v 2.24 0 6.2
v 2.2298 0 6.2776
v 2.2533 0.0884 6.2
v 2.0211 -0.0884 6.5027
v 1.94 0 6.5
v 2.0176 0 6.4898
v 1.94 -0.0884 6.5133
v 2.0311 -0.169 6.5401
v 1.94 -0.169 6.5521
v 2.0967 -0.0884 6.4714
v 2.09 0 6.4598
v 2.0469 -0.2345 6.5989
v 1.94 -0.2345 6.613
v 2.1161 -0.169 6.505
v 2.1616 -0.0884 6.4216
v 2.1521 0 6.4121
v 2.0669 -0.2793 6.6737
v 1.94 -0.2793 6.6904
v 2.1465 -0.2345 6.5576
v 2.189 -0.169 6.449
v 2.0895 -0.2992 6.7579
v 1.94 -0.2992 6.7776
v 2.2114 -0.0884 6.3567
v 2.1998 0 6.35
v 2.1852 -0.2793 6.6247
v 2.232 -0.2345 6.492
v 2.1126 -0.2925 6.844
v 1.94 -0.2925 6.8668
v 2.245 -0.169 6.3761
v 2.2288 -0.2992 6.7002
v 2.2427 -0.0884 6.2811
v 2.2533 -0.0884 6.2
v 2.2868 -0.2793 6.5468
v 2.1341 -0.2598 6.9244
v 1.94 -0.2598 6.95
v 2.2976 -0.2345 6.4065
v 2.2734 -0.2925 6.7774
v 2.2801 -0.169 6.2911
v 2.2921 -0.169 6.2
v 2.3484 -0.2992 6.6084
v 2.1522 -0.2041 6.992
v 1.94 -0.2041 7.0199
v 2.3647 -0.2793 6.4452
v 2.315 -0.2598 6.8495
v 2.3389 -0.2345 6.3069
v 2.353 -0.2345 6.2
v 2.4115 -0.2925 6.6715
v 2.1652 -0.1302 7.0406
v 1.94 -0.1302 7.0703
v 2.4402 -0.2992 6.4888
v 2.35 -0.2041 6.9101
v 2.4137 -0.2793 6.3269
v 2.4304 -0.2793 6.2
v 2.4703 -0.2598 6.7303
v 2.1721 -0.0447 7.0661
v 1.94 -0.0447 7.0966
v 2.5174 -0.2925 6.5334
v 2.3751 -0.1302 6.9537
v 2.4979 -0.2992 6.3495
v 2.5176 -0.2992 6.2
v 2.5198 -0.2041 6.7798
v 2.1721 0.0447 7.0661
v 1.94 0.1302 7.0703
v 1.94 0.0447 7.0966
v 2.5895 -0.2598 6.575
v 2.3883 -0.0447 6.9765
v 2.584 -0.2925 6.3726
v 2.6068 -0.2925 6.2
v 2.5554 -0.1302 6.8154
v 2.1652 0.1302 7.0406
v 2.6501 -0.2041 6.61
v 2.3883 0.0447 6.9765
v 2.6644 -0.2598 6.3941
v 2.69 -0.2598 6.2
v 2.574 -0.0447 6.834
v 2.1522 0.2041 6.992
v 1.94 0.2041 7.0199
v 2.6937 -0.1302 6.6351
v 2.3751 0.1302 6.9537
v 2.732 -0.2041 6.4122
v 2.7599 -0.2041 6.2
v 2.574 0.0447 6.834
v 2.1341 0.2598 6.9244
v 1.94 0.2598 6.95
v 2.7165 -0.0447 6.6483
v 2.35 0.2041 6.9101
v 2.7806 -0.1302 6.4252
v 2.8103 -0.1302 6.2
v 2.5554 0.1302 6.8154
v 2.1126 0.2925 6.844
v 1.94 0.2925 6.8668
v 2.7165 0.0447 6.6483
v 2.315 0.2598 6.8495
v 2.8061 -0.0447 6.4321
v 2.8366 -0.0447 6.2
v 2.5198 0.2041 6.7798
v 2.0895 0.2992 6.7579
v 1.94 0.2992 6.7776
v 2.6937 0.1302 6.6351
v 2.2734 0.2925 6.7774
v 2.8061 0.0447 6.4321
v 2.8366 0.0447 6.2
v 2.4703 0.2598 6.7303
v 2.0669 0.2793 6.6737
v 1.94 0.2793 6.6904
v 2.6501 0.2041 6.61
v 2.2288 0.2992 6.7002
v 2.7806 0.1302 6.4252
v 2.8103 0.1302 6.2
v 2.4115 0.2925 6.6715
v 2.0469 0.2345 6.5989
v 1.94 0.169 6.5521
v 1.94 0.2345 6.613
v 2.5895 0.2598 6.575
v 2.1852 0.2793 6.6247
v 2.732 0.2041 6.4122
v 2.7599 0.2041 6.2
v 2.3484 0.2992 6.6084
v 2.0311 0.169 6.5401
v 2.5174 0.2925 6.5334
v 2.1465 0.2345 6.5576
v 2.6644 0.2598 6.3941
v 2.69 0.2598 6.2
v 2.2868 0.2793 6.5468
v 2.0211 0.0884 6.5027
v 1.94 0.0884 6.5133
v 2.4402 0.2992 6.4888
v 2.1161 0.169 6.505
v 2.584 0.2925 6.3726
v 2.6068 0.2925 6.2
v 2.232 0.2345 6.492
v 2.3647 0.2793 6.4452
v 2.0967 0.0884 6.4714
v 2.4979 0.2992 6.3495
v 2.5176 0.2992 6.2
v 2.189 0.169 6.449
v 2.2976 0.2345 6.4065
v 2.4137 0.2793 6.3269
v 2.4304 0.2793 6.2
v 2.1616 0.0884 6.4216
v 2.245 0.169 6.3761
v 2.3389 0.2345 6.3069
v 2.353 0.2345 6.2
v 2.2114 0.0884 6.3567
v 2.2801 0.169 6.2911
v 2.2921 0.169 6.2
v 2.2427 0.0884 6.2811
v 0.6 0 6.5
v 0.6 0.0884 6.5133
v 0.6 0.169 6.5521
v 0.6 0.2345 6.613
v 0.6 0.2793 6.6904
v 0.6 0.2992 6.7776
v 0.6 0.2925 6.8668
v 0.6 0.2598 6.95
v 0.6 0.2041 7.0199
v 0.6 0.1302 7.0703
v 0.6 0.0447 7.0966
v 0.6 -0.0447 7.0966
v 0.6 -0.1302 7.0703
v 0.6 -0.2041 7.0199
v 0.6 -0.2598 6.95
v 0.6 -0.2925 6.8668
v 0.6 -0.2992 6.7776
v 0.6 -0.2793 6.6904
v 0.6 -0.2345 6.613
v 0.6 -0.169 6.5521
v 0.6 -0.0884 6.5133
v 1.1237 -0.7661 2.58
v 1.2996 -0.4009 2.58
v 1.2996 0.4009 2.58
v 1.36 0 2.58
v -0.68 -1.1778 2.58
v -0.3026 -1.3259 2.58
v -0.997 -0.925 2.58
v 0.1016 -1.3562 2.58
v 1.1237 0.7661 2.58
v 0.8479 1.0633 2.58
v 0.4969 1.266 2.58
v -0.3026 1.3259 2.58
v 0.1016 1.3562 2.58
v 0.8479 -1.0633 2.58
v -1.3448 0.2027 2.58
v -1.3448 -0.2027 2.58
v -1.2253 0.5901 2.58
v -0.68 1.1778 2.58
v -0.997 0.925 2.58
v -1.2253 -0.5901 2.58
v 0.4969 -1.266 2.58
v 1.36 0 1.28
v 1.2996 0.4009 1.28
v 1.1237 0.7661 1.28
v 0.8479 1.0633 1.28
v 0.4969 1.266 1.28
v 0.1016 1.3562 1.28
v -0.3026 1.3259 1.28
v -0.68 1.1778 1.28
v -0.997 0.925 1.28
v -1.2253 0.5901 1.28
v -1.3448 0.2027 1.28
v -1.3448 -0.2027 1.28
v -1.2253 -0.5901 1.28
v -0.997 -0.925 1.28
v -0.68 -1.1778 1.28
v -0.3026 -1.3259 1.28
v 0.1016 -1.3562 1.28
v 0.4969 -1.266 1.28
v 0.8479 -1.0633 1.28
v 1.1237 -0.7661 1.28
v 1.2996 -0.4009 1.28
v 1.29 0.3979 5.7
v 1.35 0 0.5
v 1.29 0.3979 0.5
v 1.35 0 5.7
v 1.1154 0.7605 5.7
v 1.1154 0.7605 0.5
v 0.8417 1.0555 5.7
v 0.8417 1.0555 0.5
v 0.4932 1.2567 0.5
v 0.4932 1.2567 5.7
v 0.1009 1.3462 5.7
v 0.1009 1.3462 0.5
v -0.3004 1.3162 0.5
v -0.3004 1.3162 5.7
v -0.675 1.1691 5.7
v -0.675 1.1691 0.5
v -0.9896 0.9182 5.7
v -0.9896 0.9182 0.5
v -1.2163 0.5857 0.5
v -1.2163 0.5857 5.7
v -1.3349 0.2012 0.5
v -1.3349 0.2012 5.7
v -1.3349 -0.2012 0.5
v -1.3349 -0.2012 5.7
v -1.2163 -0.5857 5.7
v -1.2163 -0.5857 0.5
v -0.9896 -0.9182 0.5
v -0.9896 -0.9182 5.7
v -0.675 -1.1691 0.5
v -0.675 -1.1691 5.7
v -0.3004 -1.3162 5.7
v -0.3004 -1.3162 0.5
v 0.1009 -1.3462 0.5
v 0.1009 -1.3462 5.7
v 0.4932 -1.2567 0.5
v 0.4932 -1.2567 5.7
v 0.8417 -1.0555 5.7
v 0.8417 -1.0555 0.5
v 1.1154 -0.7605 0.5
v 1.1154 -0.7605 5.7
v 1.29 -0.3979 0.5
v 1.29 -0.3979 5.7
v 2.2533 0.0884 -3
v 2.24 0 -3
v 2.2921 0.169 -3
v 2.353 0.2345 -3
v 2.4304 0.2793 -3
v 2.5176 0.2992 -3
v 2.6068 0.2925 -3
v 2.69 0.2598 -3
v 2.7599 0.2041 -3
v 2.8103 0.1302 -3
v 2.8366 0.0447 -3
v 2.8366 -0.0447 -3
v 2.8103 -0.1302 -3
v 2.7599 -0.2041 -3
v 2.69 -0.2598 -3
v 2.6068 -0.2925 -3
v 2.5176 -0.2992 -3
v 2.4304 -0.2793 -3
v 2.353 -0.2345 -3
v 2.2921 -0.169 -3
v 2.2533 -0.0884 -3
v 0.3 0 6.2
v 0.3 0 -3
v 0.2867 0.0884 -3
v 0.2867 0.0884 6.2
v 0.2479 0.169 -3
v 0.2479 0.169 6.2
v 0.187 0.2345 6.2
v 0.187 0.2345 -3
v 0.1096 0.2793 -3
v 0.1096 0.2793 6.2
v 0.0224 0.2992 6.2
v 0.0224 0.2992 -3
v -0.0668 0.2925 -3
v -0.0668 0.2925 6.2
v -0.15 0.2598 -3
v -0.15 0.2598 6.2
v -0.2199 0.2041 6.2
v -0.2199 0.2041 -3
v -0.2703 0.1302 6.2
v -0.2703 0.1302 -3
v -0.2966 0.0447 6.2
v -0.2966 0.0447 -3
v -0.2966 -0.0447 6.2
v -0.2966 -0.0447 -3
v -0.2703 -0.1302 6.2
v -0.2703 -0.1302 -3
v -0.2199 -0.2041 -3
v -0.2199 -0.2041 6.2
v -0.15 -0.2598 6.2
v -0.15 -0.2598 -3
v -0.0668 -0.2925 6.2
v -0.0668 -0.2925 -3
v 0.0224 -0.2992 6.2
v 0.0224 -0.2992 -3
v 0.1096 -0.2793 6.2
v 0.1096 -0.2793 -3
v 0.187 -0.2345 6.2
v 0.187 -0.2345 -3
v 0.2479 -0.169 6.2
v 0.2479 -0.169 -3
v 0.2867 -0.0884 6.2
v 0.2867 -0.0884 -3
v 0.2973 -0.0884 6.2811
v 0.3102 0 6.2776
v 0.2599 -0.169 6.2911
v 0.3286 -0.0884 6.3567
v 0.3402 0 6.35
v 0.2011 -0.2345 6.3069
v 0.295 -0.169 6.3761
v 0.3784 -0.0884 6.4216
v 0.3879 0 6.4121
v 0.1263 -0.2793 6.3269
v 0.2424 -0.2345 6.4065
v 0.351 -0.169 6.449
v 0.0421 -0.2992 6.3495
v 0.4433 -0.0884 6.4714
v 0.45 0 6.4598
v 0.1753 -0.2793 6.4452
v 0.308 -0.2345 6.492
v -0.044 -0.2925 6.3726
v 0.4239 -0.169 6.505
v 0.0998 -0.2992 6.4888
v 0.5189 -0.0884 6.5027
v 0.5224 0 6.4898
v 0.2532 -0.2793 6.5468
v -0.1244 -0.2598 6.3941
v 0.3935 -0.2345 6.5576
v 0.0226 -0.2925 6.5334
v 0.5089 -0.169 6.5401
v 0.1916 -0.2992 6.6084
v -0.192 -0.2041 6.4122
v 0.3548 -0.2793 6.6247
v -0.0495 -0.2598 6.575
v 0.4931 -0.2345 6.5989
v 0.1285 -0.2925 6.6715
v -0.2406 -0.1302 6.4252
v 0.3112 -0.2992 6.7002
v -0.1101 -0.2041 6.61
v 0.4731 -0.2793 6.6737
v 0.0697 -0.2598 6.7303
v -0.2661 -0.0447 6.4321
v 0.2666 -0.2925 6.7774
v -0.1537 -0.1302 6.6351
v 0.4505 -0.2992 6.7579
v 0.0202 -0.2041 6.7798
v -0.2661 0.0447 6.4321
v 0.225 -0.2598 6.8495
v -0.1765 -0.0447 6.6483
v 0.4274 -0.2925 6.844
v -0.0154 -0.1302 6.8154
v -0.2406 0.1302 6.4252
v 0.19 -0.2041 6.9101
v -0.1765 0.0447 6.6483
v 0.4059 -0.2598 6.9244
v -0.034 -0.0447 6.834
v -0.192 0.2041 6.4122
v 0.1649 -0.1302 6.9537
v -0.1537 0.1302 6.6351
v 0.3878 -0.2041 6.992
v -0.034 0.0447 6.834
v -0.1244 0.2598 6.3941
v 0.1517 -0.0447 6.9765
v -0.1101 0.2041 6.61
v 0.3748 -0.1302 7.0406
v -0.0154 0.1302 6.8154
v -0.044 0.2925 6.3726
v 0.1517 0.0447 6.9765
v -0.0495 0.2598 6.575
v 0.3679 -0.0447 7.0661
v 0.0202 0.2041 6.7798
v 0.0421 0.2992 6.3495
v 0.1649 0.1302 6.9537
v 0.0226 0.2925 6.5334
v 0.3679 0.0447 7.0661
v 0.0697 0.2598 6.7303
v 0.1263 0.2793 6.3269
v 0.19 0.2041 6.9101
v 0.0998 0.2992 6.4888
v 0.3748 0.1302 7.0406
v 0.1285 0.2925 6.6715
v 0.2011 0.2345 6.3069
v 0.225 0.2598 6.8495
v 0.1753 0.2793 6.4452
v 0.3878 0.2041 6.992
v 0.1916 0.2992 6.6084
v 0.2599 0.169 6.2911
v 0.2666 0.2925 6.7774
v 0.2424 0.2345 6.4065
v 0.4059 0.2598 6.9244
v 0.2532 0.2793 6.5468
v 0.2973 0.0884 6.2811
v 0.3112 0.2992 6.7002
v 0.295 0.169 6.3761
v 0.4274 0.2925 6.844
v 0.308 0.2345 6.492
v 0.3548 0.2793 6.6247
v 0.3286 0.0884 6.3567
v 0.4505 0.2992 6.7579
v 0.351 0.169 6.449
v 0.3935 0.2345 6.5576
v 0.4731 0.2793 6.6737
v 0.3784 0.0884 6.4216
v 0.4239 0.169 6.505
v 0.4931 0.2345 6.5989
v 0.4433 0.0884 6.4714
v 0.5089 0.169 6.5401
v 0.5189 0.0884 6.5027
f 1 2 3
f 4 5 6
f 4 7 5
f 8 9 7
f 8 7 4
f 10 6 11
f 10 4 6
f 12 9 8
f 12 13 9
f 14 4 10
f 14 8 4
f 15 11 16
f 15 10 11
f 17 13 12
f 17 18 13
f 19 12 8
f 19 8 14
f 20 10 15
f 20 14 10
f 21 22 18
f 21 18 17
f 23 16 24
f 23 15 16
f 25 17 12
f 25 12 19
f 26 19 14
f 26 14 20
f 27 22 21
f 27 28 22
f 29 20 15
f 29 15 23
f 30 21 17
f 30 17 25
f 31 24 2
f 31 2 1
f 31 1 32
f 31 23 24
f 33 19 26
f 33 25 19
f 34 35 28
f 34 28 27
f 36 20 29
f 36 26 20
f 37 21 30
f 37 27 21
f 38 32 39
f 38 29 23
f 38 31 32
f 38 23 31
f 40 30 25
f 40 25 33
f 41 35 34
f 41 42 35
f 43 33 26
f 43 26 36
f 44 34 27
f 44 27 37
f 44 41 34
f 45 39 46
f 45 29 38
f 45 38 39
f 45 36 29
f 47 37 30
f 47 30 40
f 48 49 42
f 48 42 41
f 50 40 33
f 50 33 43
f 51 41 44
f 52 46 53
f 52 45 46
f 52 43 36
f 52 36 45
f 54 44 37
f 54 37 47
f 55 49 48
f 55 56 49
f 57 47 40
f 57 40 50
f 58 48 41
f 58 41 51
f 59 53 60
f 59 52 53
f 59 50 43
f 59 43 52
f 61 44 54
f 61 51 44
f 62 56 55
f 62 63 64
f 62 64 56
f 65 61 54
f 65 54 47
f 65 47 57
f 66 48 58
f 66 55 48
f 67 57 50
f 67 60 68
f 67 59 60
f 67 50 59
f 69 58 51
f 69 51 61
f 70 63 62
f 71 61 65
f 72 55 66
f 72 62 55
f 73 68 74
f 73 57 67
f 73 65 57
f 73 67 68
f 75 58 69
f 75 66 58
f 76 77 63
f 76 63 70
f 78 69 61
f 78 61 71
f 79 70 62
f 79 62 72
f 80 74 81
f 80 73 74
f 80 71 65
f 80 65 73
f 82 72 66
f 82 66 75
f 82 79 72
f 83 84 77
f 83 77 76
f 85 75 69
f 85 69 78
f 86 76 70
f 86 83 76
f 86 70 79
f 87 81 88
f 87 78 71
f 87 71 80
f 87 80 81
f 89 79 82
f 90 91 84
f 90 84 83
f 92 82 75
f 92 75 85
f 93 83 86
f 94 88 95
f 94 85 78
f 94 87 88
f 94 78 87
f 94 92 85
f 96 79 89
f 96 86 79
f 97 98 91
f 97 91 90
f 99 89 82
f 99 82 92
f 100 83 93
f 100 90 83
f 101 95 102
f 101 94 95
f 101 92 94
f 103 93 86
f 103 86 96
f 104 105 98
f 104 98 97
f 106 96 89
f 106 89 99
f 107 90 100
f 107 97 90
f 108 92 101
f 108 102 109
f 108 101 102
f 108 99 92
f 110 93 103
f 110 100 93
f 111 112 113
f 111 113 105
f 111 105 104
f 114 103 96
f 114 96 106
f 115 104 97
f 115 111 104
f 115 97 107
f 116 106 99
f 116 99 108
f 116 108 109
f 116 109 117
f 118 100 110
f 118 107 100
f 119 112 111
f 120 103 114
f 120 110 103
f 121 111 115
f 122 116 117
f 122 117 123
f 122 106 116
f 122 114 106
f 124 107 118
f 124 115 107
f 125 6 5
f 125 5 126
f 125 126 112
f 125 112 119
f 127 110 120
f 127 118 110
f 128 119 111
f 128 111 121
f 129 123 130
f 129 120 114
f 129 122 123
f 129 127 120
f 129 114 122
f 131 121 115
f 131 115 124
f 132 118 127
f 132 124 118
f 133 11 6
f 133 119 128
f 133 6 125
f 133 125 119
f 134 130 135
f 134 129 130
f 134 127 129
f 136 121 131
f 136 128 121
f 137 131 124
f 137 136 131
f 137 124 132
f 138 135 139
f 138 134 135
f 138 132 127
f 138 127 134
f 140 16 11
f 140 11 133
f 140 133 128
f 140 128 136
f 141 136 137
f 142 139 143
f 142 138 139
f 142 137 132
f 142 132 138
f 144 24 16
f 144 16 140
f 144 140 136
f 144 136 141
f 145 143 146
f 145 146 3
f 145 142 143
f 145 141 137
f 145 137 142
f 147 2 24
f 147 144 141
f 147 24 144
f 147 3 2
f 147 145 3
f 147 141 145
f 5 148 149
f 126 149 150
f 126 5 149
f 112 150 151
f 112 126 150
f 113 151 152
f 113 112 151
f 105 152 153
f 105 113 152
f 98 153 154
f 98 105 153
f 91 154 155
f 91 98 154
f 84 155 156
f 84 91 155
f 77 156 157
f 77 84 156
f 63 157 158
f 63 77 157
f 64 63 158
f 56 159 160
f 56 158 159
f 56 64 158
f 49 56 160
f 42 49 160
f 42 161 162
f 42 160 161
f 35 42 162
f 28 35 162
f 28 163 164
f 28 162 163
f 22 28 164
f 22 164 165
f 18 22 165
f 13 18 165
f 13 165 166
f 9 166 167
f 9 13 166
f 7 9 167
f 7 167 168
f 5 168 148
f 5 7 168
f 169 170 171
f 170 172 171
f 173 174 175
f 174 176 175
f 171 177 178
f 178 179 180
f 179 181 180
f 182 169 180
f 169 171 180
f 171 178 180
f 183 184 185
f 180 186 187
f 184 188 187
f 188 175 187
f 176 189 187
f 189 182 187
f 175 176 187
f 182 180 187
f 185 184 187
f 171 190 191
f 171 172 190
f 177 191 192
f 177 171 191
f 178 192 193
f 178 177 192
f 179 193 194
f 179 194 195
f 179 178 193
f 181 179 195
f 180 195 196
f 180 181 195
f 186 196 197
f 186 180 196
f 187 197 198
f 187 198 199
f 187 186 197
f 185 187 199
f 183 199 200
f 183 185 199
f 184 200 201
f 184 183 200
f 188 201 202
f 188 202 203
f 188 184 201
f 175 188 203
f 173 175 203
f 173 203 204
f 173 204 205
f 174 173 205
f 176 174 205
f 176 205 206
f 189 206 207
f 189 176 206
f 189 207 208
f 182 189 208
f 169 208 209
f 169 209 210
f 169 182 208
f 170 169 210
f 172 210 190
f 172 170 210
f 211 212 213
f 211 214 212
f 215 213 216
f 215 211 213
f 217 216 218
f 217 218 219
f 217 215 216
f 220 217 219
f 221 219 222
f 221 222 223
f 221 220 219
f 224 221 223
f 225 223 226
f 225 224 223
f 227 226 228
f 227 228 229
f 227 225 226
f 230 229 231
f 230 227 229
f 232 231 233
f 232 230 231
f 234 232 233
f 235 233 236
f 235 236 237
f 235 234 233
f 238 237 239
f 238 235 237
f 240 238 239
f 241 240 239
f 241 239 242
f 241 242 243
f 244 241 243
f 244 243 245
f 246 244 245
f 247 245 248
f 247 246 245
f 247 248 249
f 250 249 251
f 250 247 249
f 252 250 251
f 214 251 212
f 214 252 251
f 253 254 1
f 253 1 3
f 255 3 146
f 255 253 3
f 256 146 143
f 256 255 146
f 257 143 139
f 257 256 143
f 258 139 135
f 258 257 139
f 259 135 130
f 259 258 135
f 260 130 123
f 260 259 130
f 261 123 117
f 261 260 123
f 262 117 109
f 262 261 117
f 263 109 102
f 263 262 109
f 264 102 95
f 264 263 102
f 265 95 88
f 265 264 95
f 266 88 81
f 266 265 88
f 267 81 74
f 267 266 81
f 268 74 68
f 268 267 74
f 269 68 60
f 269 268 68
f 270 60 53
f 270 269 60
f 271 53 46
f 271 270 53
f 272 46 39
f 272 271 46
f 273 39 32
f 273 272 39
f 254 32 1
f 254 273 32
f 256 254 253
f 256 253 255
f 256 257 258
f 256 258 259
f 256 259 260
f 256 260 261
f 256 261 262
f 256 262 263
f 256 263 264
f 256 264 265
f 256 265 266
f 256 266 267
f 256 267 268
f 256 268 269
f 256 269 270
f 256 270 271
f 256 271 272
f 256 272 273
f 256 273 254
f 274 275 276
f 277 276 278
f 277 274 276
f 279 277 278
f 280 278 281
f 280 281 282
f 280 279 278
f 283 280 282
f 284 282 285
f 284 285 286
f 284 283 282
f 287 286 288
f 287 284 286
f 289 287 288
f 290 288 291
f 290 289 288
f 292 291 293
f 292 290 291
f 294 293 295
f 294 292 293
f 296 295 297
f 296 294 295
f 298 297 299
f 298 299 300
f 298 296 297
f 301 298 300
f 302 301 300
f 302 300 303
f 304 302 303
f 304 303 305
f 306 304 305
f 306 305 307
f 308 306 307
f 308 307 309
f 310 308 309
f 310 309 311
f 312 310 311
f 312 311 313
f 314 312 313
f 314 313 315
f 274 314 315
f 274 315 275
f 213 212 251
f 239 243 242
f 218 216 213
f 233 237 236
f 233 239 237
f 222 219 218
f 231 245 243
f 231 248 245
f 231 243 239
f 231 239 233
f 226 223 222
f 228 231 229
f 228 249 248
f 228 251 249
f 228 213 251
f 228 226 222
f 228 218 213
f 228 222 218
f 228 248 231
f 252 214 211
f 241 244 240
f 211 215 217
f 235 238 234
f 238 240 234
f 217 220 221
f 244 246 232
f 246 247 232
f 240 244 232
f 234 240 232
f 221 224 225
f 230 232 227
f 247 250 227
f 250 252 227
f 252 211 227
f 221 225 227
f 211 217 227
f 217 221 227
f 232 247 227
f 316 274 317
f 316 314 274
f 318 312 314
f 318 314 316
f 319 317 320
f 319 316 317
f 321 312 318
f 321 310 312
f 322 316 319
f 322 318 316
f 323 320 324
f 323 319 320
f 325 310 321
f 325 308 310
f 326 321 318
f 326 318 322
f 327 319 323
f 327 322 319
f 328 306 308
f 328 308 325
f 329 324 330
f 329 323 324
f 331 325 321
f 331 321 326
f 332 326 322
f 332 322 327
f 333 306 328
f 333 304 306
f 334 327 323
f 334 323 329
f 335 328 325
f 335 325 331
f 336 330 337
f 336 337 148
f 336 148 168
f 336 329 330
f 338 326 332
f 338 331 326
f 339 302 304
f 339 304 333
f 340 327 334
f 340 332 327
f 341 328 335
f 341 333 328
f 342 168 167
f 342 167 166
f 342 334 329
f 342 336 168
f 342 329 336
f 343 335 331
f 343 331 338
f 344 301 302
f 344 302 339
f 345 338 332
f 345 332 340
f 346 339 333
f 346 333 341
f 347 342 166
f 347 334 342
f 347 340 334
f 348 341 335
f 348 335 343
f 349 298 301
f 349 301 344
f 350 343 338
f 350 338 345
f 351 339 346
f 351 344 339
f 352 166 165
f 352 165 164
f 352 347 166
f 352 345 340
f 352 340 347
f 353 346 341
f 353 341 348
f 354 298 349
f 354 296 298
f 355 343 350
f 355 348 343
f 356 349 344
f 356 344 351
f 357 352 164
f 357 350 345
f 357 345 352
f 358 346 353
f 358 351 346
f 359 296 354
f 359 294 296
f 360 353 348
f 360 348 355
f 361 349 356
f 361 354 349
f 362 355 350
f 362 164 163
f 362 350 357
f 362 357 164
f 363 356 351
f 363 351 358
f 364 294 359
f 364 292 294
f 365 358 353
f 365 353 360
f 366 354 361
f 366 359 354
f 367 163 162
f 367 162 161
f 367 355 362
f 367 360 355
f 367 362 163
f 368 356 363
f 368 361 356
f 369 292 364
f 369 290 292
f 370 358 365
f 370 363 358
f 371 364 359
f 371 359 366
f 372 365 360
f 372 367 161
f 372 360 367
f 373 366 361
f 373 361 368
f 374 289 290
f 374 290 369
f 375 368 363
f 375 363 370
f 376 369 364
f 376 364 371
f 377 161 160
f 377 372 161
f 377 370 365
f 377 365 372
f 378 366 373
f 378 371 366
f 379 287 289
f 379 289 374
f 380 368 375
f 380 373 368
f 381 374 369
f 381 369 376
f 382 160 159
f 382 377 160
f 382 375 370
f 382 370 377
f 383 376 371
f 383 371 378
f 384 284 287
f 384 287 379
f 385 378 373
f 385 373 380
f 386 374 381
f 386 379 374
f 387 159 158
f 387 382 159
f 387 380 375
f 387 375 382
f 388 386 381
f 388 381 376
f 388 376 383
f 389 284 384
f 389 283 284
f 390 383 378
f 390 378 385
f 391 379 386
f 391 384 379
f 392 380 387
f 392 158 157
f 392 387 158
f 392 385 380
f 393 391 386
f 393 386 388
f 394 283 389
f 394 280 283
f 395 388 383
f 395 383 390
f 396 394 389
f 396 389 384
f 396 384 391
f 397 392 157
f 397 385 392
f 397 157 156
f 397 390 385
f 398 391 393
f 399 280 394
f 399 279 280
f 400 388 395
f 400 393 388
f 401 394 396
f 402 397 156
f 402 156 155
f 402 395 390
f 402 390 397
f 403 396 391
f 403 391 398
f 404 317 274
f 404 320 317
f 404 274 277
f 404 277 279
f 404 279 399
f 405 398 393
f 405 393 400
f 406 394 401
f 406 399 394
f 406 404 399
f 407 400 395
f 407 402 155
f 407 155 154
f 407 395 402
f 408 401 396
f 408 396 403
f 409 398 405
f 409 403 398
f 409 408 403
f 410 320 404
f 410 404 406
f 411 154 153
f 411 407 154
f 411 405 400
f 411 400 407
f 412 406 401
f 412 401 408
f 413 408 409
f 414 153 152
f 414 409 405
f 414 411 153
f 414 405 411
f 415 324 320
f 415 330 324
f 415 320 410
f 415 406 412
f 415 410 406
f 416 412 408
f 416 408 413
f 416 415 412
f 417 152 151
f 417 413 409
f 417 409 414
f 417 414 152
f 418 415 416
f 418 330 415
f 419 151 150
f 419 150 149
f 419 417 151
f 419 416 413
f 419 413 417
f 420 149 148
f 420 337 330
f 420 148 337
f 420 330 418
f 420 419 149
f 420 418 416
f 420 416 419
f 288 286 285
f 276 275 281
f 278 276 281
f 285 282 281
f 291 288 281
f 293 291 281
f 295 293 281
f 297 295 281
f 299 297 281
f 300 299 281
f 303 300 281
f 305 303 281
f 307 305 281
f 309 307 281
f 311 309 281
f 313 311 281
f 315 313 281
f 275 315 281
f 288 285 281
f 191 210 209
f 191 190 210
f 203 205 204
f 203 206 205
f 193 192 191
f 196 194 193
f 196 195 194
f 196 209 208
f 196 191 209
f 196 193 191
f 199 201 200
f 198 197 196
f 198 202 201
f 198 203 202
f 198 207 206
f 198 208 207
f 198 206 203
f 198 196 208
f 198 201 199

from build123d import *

# Parameters (mm, degrees)
SKETCH001_R = 0.3
SKETCH002_W = 1.35
SKETCH002_H = 5.2
SKETCH003_W = 1.36
SKETCH003_H = 1.3


with BuildPart() as sweep_body:
    # Sweep: sweep along a path in Sketch
    with BuildLine(Plane.XZ) as sweep_path:
        Line((0, -3), (0, 6.2))
        ThreePointArc((0, 6.2), (0.175736, 6.624264), (0.6, 6.8))
        Line((0.6, 6.8), (1.94, 6.8))
        ThreePointArc((1.94, 6.8), (2.364264, 6.624264), (2.54, 6.2))
        Line((2.54, 6.2), (2.54, -3))
    # Sketch001 → Sweep (sweep)
    with BuildSketch(Plane.XY):
        Circle(SKETCH001_R)
    sweep(path=sweep_path.line)


with BuildPart() as revolution:
    # Sketch002 → Revolution (revolve)
    with BuildSketch(Plane.XZ):
        with Locations((0.675, 3.1)):
            Rectangle(SKETCH002_W, SKETCH002_H)
    revolve(axis=Axis((0, 0, 0.5), (0, 0, 1)))


with BuildPart() as revolution001:
    # Sketch003 → Revolution001 (revolve)
    with BuildSketch(Plane.XZ):
        with Locations((0.68, 1.93)):
            Rectangle(SKETCH003_W, SKETCH003_H)
    revolve(axis=Axis((0, 0, 0), (0, 0, 1)))


solid = Compound([sweep_body.part, revolution.part, revolution001.part])
